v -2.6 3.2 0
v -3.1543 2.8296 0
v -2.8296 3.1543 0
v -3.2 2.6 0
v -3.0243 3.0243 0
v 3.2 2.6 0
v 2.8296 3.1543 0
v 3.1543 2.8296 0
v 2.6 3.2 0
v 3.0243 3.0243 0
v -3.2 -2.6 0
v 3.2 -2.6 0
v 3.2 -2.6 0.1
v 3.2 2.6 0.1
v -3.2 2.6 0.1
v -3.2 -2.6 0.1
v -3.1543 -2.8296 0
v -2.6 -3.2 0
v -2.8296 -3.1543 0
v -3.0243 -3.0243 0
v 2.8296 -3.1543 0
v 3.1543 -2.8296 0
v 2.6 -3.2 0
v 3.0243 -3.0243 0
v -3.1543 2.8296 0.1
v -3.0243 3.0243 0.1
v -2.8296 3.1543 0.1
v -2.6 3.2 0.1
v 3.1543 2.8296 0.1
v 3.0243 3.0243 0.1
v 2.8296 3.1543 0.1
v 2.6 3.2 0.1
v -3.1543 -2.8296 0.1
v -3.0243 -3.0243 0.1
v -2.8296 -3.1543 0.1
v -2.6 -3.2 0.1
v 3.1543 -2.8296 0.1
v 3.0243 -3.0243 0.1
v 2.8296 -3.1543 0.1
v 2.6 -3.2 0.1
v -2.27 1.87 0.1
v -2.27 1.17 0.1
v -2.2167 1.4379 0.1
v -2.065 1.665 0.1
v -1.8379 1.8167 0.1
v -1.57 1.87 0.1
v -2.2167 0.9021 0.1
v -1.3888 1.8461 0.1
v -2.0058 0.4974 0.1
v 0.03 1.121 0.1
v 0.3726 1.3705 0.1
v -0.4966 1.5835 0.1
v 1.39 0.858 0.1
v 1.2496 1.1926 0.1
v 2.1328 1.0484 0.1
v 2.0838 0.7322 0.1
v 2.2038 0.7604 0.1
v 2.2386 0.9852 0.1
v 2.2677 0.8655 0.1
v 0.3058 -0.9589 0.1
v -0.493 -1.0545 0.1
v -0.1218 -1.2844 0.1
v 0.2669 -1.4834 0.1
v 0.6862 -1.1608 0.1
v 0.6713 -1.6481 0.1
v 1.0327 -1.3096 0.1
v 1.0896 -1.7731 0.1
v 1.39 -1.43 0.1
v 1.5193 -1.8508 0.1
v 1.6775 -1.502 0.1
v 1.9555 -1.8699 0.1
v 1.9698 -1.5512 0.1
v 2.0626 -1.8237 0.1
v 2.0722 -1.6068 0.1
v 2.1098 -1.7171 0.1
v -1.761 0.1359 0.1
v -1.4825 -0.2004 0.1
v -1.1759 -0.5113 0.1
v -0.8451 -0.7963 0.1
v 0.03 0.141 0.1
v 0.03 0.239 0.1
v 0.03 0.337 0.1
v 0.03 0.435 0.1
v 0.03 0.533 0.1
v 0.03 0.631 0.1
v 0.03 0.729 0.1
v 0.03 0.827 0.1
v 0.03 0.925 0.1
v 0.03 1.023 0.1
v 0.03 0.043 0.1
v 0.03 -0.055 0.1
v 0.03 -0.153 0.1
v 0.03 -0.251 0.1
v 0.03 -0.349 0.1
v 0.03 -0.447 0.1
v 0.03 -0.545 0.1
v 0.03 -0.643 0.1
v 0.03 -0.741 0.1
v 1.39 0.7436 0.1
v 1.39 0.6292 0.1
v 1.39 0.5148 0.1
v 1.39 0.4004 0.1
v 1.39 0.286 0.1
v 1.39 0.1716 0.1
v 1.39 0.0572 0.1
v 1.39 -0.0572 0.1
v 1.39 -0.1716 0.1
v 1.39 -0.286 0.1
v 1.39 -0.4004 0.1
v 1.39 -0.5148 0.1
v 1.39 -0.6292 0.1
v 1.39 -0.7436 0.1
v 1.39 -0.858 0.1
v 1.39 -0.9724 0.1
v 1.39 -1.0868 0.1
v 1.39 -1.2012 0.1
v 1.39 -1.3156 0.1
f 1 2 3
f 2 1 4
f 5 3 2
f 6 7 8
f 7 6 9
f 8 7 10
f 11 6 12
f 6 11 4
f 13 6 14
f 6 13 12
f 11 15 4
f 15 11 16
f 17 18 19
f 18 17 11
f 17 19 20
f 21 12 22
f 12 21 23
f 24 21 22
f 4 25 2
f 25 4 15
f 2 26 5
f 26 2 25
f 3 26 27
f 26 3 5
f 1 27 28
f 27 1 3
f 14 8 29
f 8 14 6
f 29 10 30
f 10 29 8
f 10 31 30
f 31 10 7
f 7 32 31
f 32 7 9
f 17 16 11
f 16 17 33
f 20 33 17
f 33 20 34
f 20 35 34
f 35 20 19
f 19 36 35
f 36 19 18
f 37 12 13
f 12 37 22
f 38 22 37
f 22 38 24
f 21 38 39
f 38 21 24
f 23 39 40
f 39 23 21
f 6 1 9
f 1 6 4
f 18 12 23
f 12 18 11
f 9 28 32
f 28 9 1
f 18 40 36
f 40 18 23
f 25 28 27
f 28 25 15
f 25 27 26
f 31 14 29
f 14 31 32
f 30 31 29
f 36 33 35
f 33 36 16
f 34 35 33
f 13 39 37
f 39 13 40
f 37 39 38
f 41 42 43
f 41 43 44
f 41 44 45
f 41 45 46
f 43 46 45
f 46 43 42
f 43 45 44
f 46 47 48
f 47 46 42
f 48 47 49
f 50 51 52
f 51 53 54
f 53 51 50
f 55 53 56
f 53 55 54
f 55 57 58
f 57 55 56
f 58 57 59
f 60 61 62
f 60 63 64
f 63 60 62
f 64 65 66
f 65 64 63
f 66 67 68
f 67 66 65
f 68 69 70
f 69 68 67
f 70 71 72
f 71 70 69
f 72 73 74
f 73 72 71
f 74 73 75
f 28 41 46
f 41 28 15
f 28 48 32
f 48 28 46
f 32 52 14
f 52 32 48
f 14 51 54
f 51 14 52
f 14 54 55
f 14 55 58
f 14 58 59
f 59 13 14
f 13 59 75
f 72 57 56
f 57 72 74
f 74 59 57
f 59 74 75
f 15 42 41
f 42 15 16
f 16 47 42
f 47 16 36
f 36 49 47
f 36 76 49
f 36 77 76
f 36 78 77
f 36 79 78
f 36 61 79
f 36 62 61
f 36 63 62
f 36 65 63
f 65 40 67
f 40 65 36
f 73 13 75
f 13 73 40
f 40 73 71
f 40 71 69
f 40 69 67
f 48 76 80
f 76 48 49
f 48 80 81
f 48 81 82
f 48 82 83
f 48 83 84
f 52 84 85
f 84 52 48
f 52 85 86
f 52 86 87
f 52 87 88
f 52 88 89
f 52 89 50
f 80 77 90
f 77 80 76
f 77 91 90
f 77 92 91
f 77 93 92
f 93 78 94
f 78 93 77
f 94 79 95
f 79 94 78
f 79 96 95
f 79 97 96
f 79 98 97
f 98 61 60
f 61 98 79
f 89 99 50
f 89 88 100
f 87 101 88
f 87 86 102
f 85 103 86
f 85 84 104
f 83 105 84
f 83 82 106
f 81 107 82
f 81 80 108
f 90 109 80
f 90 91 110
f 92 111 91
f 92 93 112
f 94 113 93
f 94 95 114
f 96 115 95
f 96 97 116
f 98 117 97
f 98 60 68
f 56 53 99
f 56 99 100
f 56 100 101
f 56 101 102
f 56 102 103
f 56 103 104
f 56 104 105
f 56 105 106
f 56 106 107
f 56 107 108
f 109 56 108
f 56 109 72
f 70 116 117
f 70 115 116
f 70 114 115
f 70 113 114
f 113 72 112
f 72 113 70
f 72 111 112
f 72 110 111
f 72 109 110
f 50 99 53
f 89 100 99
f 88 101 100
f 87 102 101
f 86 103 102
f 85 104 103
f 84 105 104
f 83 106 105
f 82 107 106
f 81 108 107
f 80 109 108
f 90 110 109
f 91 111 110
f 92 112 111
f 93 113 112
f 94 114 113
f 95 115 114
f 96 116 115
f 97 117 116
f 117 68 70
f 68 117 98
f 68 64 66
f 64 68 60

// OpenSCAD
// file: ../p/box3u12.scad
use <../lib.scad>
function ldraw_lib__box3u12() = [
// 0 Box with 3 Parallel Faces without Any Edges
// 0 Name: box3u12.dat
// 0 Author: J.C. Tchang [tchang]
// 0 !LDRAW_ORG Primitive UPDATE 2014-02
// 0 !LICENSE Licensed under CC BY 4.0 : see CAreadme.txt
// 
// 0 BFC CERTIFY CCW
  [0,"BFC","CERTIFY"],
  [0,"BFC","CCW"],
// 
// 0 !HISTORY 2014-12-23 [PTadmin] Official Update 2014-02
// 
// 
// 4 16 -1 1 1 1 1 1 1 1 -1 -1 1 -1
  [4,16,-1,1,1,1,1,1,1,1,-1,-1,1,-1],
// 4 16 -1 1 1 -1 0 1 1 0 1 1 1 1
  [4,16,-1,1,1,-1,0,1,1,0,1,1,1,1],
// 4 16 1 1 -1 1 0 -1 -1 0 -1 -1 1 -1
  [4,16,1,1,-1,1,0,-1,-1,0,-1,-1,1,-1],
];
module ldraw_lib__box3u12(step=0, col=false, unit=2/5, alt=false, line=0.2, solid=!$preview)
    makepoly(ldraw_lib__box3u12(), step=step, col=col, unit=unit, alt=alt, line=line, solid=solid);
ldraw_lib__box3u12(line=0.2);
// file: ../p/1-4cyli.scad
use <../lib.scad>
function ldraw_lib__1_4cyli() = [
// 0 Cylinder 0.25
// 0 Name: 1-4cyli.dat
// 0 Author: James Jessiman
// 0 !LDRAW_ORG Primitive UPDATE 2012-01
// 0 !LICENSE Licensed under CC BY 4.0 : see CAreadme.txt
// 
// 0 BFC CERTIFY CCW
  [0,"BFC","CERTIFY"],
  [0,"BFC","CCW"],
// 
// 0 !HISTORY 2002-03-23 [sbliss] Added BFC statement.
// 0 !HISTORY 2002-04-25 [PTadmin] Official Update 2002-02
// 0 !HISTORY 2007-06-22 [PTadmin] Header formatted for Contributor Agreement
// 0 !HISTORY 2008-07-01 [PTadmin] Official Update 2008-01
// 0 !HISTORY 2012-02-16 [Philo] Changed to CCW
// 0 !HISTORY 2012-03-30 [PTadmin] Official Update 2012-01
// 
// 
// 4 16 1 1 0 0.9239 1 0.3827 0.9239 0 0.3827 1 0 0
  [4,16,1,1,0,0.9239,1,0.3827,0.9239,0,0.3827,1,0,0],
// 5 24 1 0 0 1 1 0 0.9239 0 0.3827 1 0 -1
  [5,24,1,0,0,1,1,0,0.9239,0,0.3827,1,0,-1],
// 4 16 0.9239 1 0.3827 0.7071 1 0.7071 0.7071 0 0.7071 0.9239 0 0.3827
  [4,16,0.9239,1,0.3827,0.7071,1,0.7071,0.7071,0,0.7071,0.9239,0,0.3827],
// 5 24 0.9239 0 0.3827 0.9239 1 0.3827 0.7071 0 0.7071 1 0 0
  [5,24,0.9239,0,0.3827,0.9239,1,0.3827,0.7071,0,0.7071,1,0,0],
// 4 16 0.7071 1 0.7071 0.3827 1 0.9239 0.3827 0 0.9239 0.7071 0 0.7071
  [4,16,0.7071,1,0.7071,0.3827,1,0.9239,0.3827,0,0.9239,0.7071,0,0.7071],
// 5 24 0.7071 0 0.7071 0.7071 1 0.7071 0.3827 0 0.9239 0.9239 0 0.3827
  [5,24,0.7071,0,0.7071,0.7071,1,0.7071,0.3827,0,0.9239,0.9239,0,0.3827],
// 4 16 0.3827 1 0.9239 0 1 1 0 0 1 0.3827 0 0.9239
  [4,16,0.3827,1,0.9239,0,1,1,0,0,1,0.3827,0,0.9239],
// 5 24 0.3827 0 0.9239 0.3827 1 0.9239 0 0 1 0.7071 0 0.7071
  [5,24,0.3827,0,0.9239,0.3827,1,0.9239,0,0,1,0.7071,0,0.7071],
// 5 24 0 0 1 0 1 1 0.3827 0 0.9239 -1 0 1
  [5,24,0,0,1,0,1,1,0.3827,0,0.9239,-1,0,1],
];
module ldraw_lib__1_4cyli(step=0, col=false, unit=2/5, alt=false, line=0.2, solid=!$preview)
    makepoly(ldraw_lib__1_4cyli(), step=step, col=col, unit=unit, alt=alt, line=line, solid=solid);
ldraw_lib__1_4cyli(line=0.2);
// file: s/stickerback008x008.scad
use <../../lib.scad>
use <../../p/1-4chrd.scad>
use <../../p/1-4cyli.scad>
use <../../p/box3u12.scad>
function ldraw_lib__s__stickerback008x008() = [
// 0 ~Sticker Back  0.8 x  0.8
// 0 Name: s\stickerback008x008.dat
// 0 Author: Massimo Maso [Sirio]
// 0 !LDRAW_ORG Subpart UPDATE 2025-08
// 0 !LICENSE Licensed under CC BY 4.0 : see CAreadme.txt
// 
// 0 BFC CERTIFY CCW
  [0,"BFC","CERTIFY"],
  [0,"BFC","CCW"],
// 
// 0 !HISTORY 2025-08-31 [OrionP] Official Update 2025-08
// 
// 0 // Primitives
// 1 16 -6.5 0 6.5 -1.5 0 0 0 -1 0 0 0 1.5 1-4chrd.dat
  [1,16,-6.5,0,6.5,-1.5,0,0,0,-1,0,0,0,1.5, ldraw_lib__1_4chrd()],
// 1 16 6.5 0 6.5 1.5 0 0 0 -1 0 0 0 1.5 1-4chrd.dat
  [1,16,6.5,0,6.5,1.5,0,0,0,-1,0,0,0,1.5, ldraw_lib__1_4chrd()],
// 1 16 0 -.25 0 0 0 8 0 .25 0 6.5 0 0 box3u12.dat
  [1,16,0,-.25,0,0,0,8,0,.25,0,6.5,0,0, ldraw_lib__box3u12()],
// 1 16 -6.5 0 -6.5 -1.5 0 0 0 -1 0 0 0 -1.5 1-4chrd.dat
  [1,16,-6.5,0,-6.5,-1.5,0,0,0,-1,0,0,0,-1.5, ldraw_lib__1_4chrd()],
// 1 16 6.5 0 -6.5 1.5 0 0 0 -1 0 0 0 -1.5 1-4chrd.dat
  [1,16,6.5,0,-6.5,1.5,0,0,0,-1,0,0,0,-1.5, ldraw_lib__1_4chrd()],
// 1 16 -6.5 0 6.5 -1.5 0 0 0 -.25 0 0 0 1.5 1-4cyli.dat
  [1,16,-6.5,0,6.5,-1.5,0,0,0,-.25,0,0,0,1.5, ldraw_lib__1_4cyli()],
// 1 16 6.5 0 6.5 1.5 0 0 0 -.25 0 0 0 1.5 1-4cyli.dat
  [1,16,6.5,0,6.5,1.5,0,0,0,-.25,0,0,0,1.5, ldraw_lib__1_4cyli()],
// 1 16 -6.5 0 -6.5 -1.5 0 0 0 -.25 0 0 0 -1.5 1-4cyli.dat
  [1,16,-6.5,0,-6.5,-1.5,0,0,0,-.25,0,0,0,-1.5, ldraw_lib__1_4cyli()],
// 1 16 6.5 0 -6.5 1.5 0 0 0 -.25 0 0 0 -1.5 1-4cyli.dat
  [1,16,6.5,0,-6.5,1.5,0,0,0,-.25,0,0,0,-1.5, ldraw_lib__1_4cyli()],
// 0 // Bottom faces
// 4 16 -8 0 6.5 -6.5 0 8 6.5 0 8 8 0 6.5
  [4,16,-8,0,6.5,-6.5,0,8,6.5,0,8,8,0,6.5],
// 4 16 -8 0 -6.5 8 0 -6.5 6.5 0 -8 -6.5 0 -8
  [4,16,-8,0,-6.5,8,0,-6.5,6.5,0,-8,-6.5,0,-8],
// 0 // Lateral faces
// 4 16 -6.5 0 8 -6.5 -.25 8 6.5 -.25 8 6.5 0 8
  [4,16,-6.5,0,8,-6.5,-.25,8,6.5,-.25,8,6.5,0,8],
// 4 16 -6.5 0 -8 6.5 0 -8 6.5 -.25 -8 -6.5 -.25 -8
  [4,16,-6.5,0,-8,6.5,0,-8,6.5,-.25,-8,-6.5,-.25,-8],
];
module ldraw_lib__s__stickerback008x008(step=0, col=false, unit=2/5, alt=false, line=0.2, solid=!$preview)
    makepoly(ldraw_lib__s__stickerback008x008(), step=step, col=col, unit=unit, alt=alt, line=line, solid=solid);
ldraw_lib__s__stickerback008x008(line=0.2);
// file: ../p/1-4ndis.scad
use <../lib.scad>
function ldraw_lib__1_4ndis() = [
// 0 Disc Negative 0.25
// 0 Name: 1-4ndis.dat
// 0 Author: James Jessiman
// 0 !LDRAW_ORG Primitive UPDATE 2012-01
// 0 !LICENSE Licensed under CC BY 4.0 : see CAreadme.txt
// 
// 0 BFC CERTIFY CCW
  [0,"BFC","CERTIFY"],
  [0,"BFC","CCW"],
// 
// 0 !HISTORY 2002-03-23 [sbliss] Added BFC Statement
// 0 !HISTORY 2002-04-25 [PTadmin] Official Update 2002-02
// 0 !HISTORY 2007-06-22 [PTadmin] Header formatted for Contributor Agreement
// 0 !HISTORY 2008-07-01 [PTadmin] Official Update 2008-01
// 0 !HISTORY 2012-02-16 [Philo] Changed to CCW
// 0 !HISTORY 2012-03-30 [PTadmin] Official Update 2012-01
// 
// 
// 3 16 0.9239 0 0.3827 1 0 0 1 0 1
  [3,16,0.9239,0,0.3827,1,0,0,1,0,1],
// 3 16 0.7071 0 0.7071 0.9239 0 0.3827 1 0 1
  [3,16,0.7071,0,0.7071,0.9239,0,0.3827,1,0,1],
// 3 16 0.3827 0 0.9239 0.7071 0 0.7071 1 0 1
  [3,16,0.3827,0,0.9239,0.7071,0,0.7071,1,0,1],
// 3 16 0 0 1 0.3827 0 0.9239 1 0 1
  [3,16,0,0,1,0.3827,0,0.9239,1,0,1],
];
module ldraw_lib__1_4ndis(step=0, col=false, unit=2/5, alt=false, line=0.2, solid=!$preview)
    makepoly(ldraw_lib__1_4ndis(), step=step, col=col, unit=unit, alt=alt, line=line, solid=solid);
ldraw_lib__1_4ndis(line=0.2);
// file: ../p/1-4chrd.scad
use <../lib.scad>
function ldraw_lib__1_4chrd() = [
// 0 Chord 0.25
// 0 Name: 1-4chrd.dat
// 0 Author: Max Martin Richter [MMR1988]
// 0 !LDRAW_ORG Primitive UPDATE 2023-05
// 0 !LICENSE Licensed under CC BY 4.0 : see CAreadme.txt
// 
// 0 BFC CERTIFY CCW
  [0,"BFC","CERTIFY"],
  [0,"BFC","CCW"],
// 
// 0 !HISTORY 2004-04-22 [PTadmin] Official Update 2004-02
// 0 !HISTORY 2007-10-09 [PTadmin] Header formatted for Contributor Agreement
// 0 !HISTORY 2008-07-01 [PTadmin] Official Update 2008-01
// 0 !HISTORY 2012-08-02 [MMR1988] Re-creation with PrimGen2 and Rectifier
// 0 !HISTORY 2012-08-09 [PTadmin] Official Update 2012-02
// 0 !HISTORY 2023-10-27 [OrionP] Change author to MMR1988 from hafhead
// 0 !HISTORY 2023-10-31 [OrionP] Official Update 2023-05
// 
// 4 16 0.9239 0 0.3827 0.3827 0 0.9239 0 0 1 1 0 0
  [4,16,0.9239,0,0.3827,0.3827,0,0.9239,0,0,1,1,0,0],
// 3 16 0.7071 0 0.7071 0.3827 0 0.9239 0.9239 0 0.3827
  [3,16,0.7071,0,0.7071,0.3827,0,0.9239,0.9239,0,0.3827],
];
module ldraw_lib__1_4chrd(step=0, col=false, unit=2/5, alt=false, line=0.2, solid=!$preview)
    makepoly(ldraw_lib__1_4chrd(), step=step, col=col, unit=unit, alt=alt, line=line, solid=solid);
ldraw_lib__1_4chrd(line=0.2);
// main file
use <../lib.scad>
use <../p/1-4chrd.scad>
use <../p/1-4ndis.scad>
use <s/stickerback008x008.scad>
function ldraw_lib__6177960g() = [
// 0 Sticker  0.8 x  0.8 with Black Air Vent on Orange Background Right (Needs Work)
// 0 Name: 6177960g.dat
// 0 Author: Massimo Maso [Sirio]
// 0 !LDRAW_ORG Part UPDATE 2025-08
// 0 !LICENSE Licensed under CC BY 4.0 : see CAreadme.txt
// 
// 0 !HELP Needs work: Some parts should be halftones.
// 0 !HELP I indicated them with triangles black and orange instead of mix of 0 discs and 25 ndis.
// 0 !HELP For now I don't have enough information to create the matrix of dots.
// 
// 0 BFC CERTIFY CCW
  [0,"BFC","CERTIFY"],
  [0,"BFC","CCW"],
// 
// 0 !KEYWORDS 720S, BrickLink 75880stk01, McLaren, Rebrickable 30896, Set 75880
// 0 !KEYWORDS Speed Champions
// 
// 0 !HISTORY 2025-08-31 [OrionP] Official Update 2025-08
// 
// 0 // Stickerback
// 1 16 0 0 0 1 0 0 0 1 0 0 0 1 s\stickerback008x008.dat
  [1,16,0,0,0,1,0,0,0,1,0,0,0,1, ldraw_lib__s__stickerback008x008()],
// 0 // Primitives
// 1 25 -6.5 -.25 6.5 -1.5 0 0 0 1 0 0 0 1.5 1-4chrd.dat
  [1,25,-6.5,-.25,6.5,-1.5,0,0,0,1,0,0,0,1.5, ldraw_lib__1_4chrd()],
// 1 25 6.5 -.25 6.5 1.5 0 0 0 1 0 0 0 1.5 1-4chrd.dat
  [1,25,6.5,-.25,6.5,1.5,0,0,0,1,0,0,0,1.5, ldraw_lib__1_4chrd()],
// 1 25 -6.5 -.25 -6.5 -1.5 0 0 0 1 0 0 0 -1.5 1-4chrd.dat
  [1,25,-6.5,-.25,-6.5,-1.5,0,0,0,1,0,0,0,-1.5, ldraw_lib__1_4chrd()],
// 1 25 6.5 -.25 -6.5 1.5 0 0 0 1 0 0 0 -1.5 1-4chrd.dat
  [1,25,6.5,-.25,-6.5,1.5,0,0,0,1,0,0,0,-1.5, ldraw_lib__1_4chrd()],
// 1 25 -3.925 -.25 2.925 -1.75 0 0 0 1 0 0 0 1.75 1-4ndis.dat
  [1,25,-3.925,-.25,2.925,-1.75,0,0,0,1,0,0,0,1.75, ldraw_lib__1_4ndis()],
// 1 0 -3.925 -.25 2.925 -1.75 0 0 0 1 0 0 0 1.75 1-4chrd.dat
  [1,0,-3.925,-.25,2.925,-1.75,0,0,0,1,0,0,0,1.75, ldraw_lib__1_4chrd()],
// 0 // Top face
// 0 // Black faces
// 4 0 -3.4721 -.25 4.6153 -3.925 -.25 4.675 -5.675 -.25 2.925 -5.5418 -.25 2.2553
  [4,0,-3.4721,-.25,4.6153,-3.925,-.25,4.675,-5.675,-.25,2.925,-5.5418,-.25,2.2553],
// 3 0 -3.4721 -.25 4.6153 -5.5418 -.25 2.2553 -5.0146 -.25 1.2436
  [3,0,-3.4721,-.25,4.6153,-5.5418,-.25,2.2553,-5.0146,-.25,1.2436],
// 3 0 .075 -.25 2.8025 .9314 -.25 3.4262 -1.2414 -.25 3.9588
  [3,0,.075,-.25,2.8025,.9314,-.25,3.4262,-1.2414,-.25,3.9588],
// 4 0 3.475 -.25 2.145 3.1241 -.25 2.9816 .9314 -.25 3.4262 .075 -.25 2.8025
  [4,0,3.475,-.25,2.145,3.1241,-.25,2.9816,.9314,-.25,3.4262,.075,-.25,2.8025],
// 4 0 5.332 -.25 2.6209 3.1241 -.25 2.9816 3.475 -.25 2.145 5.2095 -.25 1.8304
  [4,0,5.332,-.25,2.6209,3.1241,-.25,2.9816,3.475,-.25,2.145,5.2095,-.25,1.8304],
// 4 0 5.5966 -.25 2.4629 5.332 -.25 2.6209 5.2095 -.25 1.8304 5.5094 -.25 1.9009
  [4,0,5.5966,-.25,2.4629,5.332,-.25,2.6209,5.2095,-.25,1.8304,5.5094,-.25,1.9009],
// 3 0 5.5966 -.25 2.4629 5.5094 -.25 1.9009 5.6693 -.25 2.1637
  [3,0,5.5966,-.25,2.4629,5.5094,-.25,1.9009,5.6693,-.25,2.1637],
// 3 0 .7646 -.25 -2.3972 -1.2325 -.25 -2.6363 -.3044 -.25 -3.211
  [3,0,.7646,-.25,-2.3972,-1.2325,-.25,-2.6363,-.3044,-.25,-3.211],
// 4 0 .7646 -.25 -2.3972 -.3044 -.25 -3.211 .6672 -.25 -3.7086 1.7154 -.25 -2.902
  [4,0,.7646,-.25,-2.3972,-.3044,-.25,-3.211,.6672,-.25,-3.7086,1.7154,-.25,-2.902],
// 4 0 2.5817 -.25 -3.2739 1.7154 -.25 -2.902 .6672 -.25 -3.7086 1.6782 -.25 -4.1202
  [4,0,2.5817,-.25,-3.2739,1.7154,-.25,-2.902,.6672,-.25,-3.7086,1.6782,-.25,-4.1202],
// 4 0 2.5817 -.25 -3.2739 1.6782 -.25 -4.1202 2.7241 -.25 -4.4327 3.475 -.25 -3.575
  [4,0,2.5817,-.25,-3.2739,1.6782,-.25,-4.1202,2.7241,-.25,-4.4327,3.475,-.25,-3.575],
// 4 0 4.1937 -.25 -3.7551 3.475 -.25 -3.575 2.7241 -.25 -4.4327 3.7983 -.25 -4.6269
  [4,0,4.1937,-.25,-3.7551,3.475,-.25,-3.575,2.7241,-.25,-4.4327,3.7983,-.25,-4.6269],
// 4 0 4.1937 -.25 -3.7551 3.7983 -.25 -4.6269 4.8888 -.25 -4.6748 4.9244 -.25 -3.8781
  [4,0,4.1937,-.25,-3.7551,3.7983,-.25,-4.6269,4.8888,-.25,-4.6748,4.9244,-.25,-3.8781],
// 4 0 5.1806 -.25 -4.0169 4.9244 -.25 -3.8781 4.8888 -.25 -4.6748 5.1564 -.25 -4.5592
  [4,0,5.1806,-.25,-4.0169,4.9244,-.25,-3.8781,4.8888,-.25,-4.6748,5.1564,-.25,-4.5592],
// 3 0 5.1806 -.25 -4.0169 5.1564 -.25 -4.5592 5.2746 -.25 -4.2928
  [3,0,5.1806,-.25,-4.0169,5.1564,-.25,-4.5592,5.2746,-.25,-4.2928],
// 0 // Orange
// 4 25 -6.5 -.25 8 -8 -.25 6.5 -5.675 -.25 4.675 -3.925 -.25 4.675
  [4,25,-6.5,-.25,8,-8,-.25,6.5,-5.675,-.25,4.675,-3.925,-.25,4.675],
// 4 25 -6.5 -.25 8 -3.925 -.25 4.675 -3.4721 -.25 4.6153 6.5 -.25 8
  [4,25,-6.5,-.25,8,-3.925,-.25,4.675,-3.4721,-.25,4.6153,6.5,-.25,8],
// 4 25 -1.2414 -.25 3.9588 8 -.25 6.5 6.5 -.25 8 -3.4721 -.25 4.6153
  [4,25,-1.2414,-.25,3.9588,8,-.25,6.5,6.5,-.25,8,-3.4721,-.25,4.6153],
// 4 25 -1.2414 -.25 3.9588 .9314 -.25 3.4262 3.1241 -.25 2.9816 8 -.25 6.5
  [4,25,-1.2414,-.25,3.9588,.9314,-.25,3.4262,3.1241,-.25,2.9816,8,-.25,6.5],
// 3 25 8 -.25 6.5 3.1241 -.25 2.9816 5.332 -.25 2.6209
  [3,25,8,-.25,6.5,3.1241,-.25,2.9816,5.332,-.25,2.6209],
// 3 25 8 -.25 6.5 5.332 -.25 2.6209 5.5966 -.25 2.4629
  [3,25,8,-.25,6.5,5.332,-.25,2.6209,5.5966,-.25,2.4629],
// 3 25 8 -.25 6.5 5.5966 -.25 2.4629 5.6693 -.25 2.1637
  [3,25,8,-.25,6.5,5.5966,-.25,2.4629,5.6693,-.25,2.1637],
// 4 25 8 -.25 6.5 5.6693 -.25 2.1637 5.2746 -.25 -4.2928 8 -.25 -6.5
  [4,25,8,-.25,6.5,5.6693,-.25,2.1637,5.2746,-.25,-4.2928,8,-.25,-6.5],
// 4 25 5.5094 -.25 1.9009 5.2095 -.25 1.8304 4.9244 -.25 -3.8781 5.1806 -.25 -4.0169
  [4,25,5.5094,-.25,1.9009,5.2095,-.25,1.8304,4.9244,-.25,-3.8781,5.1806,-.25,-4.0169],
// 4 25 5.5094 -.25 1.9009 5.1806 -.25 -4.0169 5.2746 -.25 -4.2928 5.6693 -.25 2.1637
  [4,25,5.5094,-.25,1.9009,5.1806,-.25,-4.0169,5.2746,-.25,-4.2928,5.6693,-.25,2.1637],
// 4 25 -8 -.25 -6.5 -5.675 -.25 2.925 -5.675 -.25 4.675 -8 -.25 6.5
  [4,25,-8,-.25,-6.5,-5.675,-.25,2.925,-5.675,-.25,4.675,-8,-.25,6.5],
// 4 25 -8 -.25 -6.5 -6.5 -.25 -8 -5.5418 -.25 2.2553 -5.675 -.25 2.925
  [4,25,-8,-.25,-6.5,-6.5,-.25,-8,-5.5418,-.25,2.2553,-5.675,-.25,2.925],
// 3 25 -6.5 -.25 -8 -5.0146 -.25 1.2436 -5.5418 -.25 2.2553
  [3,25,-6.5,-.25,-8,-5.0146,-.25,1.2436,-5.5418,-.25,2.2553],
// 3 25 -6.5 -.25 -8 -4.4025 -.25 .3398 -5.0146 -.25 1.2436
  [3,25,-6.5,-.25,-8,-4.4025,-.25,.3398,-5.0146,-.25,1.2436],
// 3 25 -6.5 -.25 -8 -3.7062 -.25 -.5009 -4.4025 -.25 .3398
  [3,25,-6.5,-.25,-8,-3.7062,-.25,-.5009,-4.4025,-.25,.3398],
// 3 25 -6.5 -.25 -8 -2.9397 -.25 -1.2782 -3.7062 -.25 -.5009
  [3,25,-6.5,-.25,-8,-2.9397,-.25,-1.2782,-3.7062,-.25,-.5009],
// 3 25 -6.5 -.25 -8 -2.1128 -.25 -1.9907 -2.9397 -.25 -1.2782
  [3,25,-6.5,-.25,-8,-2.1128,-.25,-1.9907,-2.9397,-.25,-1.2782],
// 3 25 -6.5 -.25 -8 -1.2325 -.25 -2.6363 -2.1128 -.25 -1.9907
  [3,25,-6.5,-.25,-8,-1.2325,-.25,-2.6363,-2.1128,-.25,-1.9907],
// 3 25 -6.5 -.25 -8 -.3044 -.25 -3.211 -1.2325 -.25 -2.6363
  [3,25,-6.5,-.25,-8,-.3044,-.25,-3.211,-1.2325,-.25,-2.6363],
// 3 25 -6.5 -.25 -8 .6672 -.25 -3.7086 -.3044 -.25 -3.211
  [3,25,-6.5,-.25,-8,.6672,-.25,-3.7086,-.3044,-.25,-3.211],
// 3 25 -6.5 -.25 -8 1.6782 -.25 -4.1202 .6672 -.25 -3.7086
  [3,25,-6.5,-.25,-8,1.6782,-.25,-4.1202,.6672,-.25,-3.7086],
// 4 25 -6.5 -.25 -8 6.5 -.25 -8 2.7241 -.25 -4.4327 1.6782 -.25 -4.1202
  [4,25,-6.5,-.25,-8,6.5,-.25,-8,2.7241,-.25,-4.4327,1.6782,-.25,-4.1202],
// 4 25 6.5 -.25 -8 8 -.25 -6.5 5.2746 -.25 -4.2928 5.1564 -.25 -4.5592
  [4,25,6.5,-.25,-8,8,-.25,-6.5,5.2746,-.25,-4.2928,5.1564,-.25,-4.5592],
// 3 25 6.5 -.25 -8 5.1564 -.25 -4.5592 4.8888 -.25 -4.6748
  [3,25,6.5,-.25,-8,5.1564,-.25,-4.5592,4.8888,-.25,-4.6748],
// 3 25 6.5 -.25 -8 4.8888 -.25 -4.6748 3.7983 -.25 -4.6269
  [3,25,6.5,-.25,-8,4.8888,-.25,-4.6748,3.7983,-.25,-4.6269],
// 3 25 6.5 -.25 -8 3.7983 -.25 -4.6269 2.7241 -.25 -4.4327
  [3,25,6.5,-.25,-8,3.7983,-.25,-4.6269,2.7241,-.25,-4.4327],
// 0 // Halftone (actually 0 discs and 25 ndis)
// 0 // Black faces
// 4 0 -3.4721 -.25 4.6153 -5.0146 -.25 1.2436 -4.4025 -.25 .3398 .075 -.25 .3525
  [4,0,-3.4721,-.25,4.6153,-5.0146,-.25,1.2436,-4.4025,-.25,.3398,.075,-.25,.3525],
// 3 0 -3.4721 -.25 4.6153 .075 -.25 .3525 .075 -.25 .5975
  [3,0,-3.4721,-.25,4.6153,.075,-.25,.3525,.075,-.25,.5975],
// 3 0 -3.4721 -.25 4.6153 .075 -.25 .5975 .075 -.25 .8425
  [3,0,-3.4721,-.25,4.6153,.075,-.25,.5975,.075,-.25,.8425],
// 3 0 -3.4721 -.25 4.6153 .075 -.25 .8425 .075 -.25 1.0875
  [3,0,-3.4721,-.25,4.6153,.075,-.25,.8425,.075,-.25,1.0875],
// 3 0 -3.4721 -.25 4.6153 .075 -.25 1.0875 .075 -.25 1.3325
  [3,0,-3.4721,-.25,4.6153,.075,-.25,1.0875,.075,-.25,1.3325],
// 4 0 -3.4721 -.25 4.6153 .075 -.25 1.3325 .075 -.25 1.5775 -1.2414 -.25 3.9588
  [4,0,-3.4721,-.25,4.6153,.075,-.25,1.3325,.075,-.25,1.5775,-1.2414,-.25,3.9588],
// 3 0 -1.2414 -.25 3.9588 .075 -.25 1.5775 .075 -.25 1.8225
  [3,0,-1.2414,-.25,3.9588,.075,-.25,1.5775,.075,-.25,1.8225],
// 3 0 -1.2414 -.25 3.9588 .075 -.25 1.8225 .075 -.25 2.0675
  [3,0,-1.2414,-.25,3.9588,.075,-.25,1.8225,.075,-.25,2.0675],
// 3 0 -1.2414 -.25 3.9588 .075 -.25 2.0675 .075 -.25 2.3125
  [3,0,-1.2414,-.25,3.9588,.075,-.25,2.0675,.075,-.25,2.3125],
// 3 0 -1.2414 -.25 3.9588 .075 -.25 2.3125 .075 -.25 2.5575
  [3,0,-1.2414,-.25,3.9588,.075,-.25,2.3125,.075,-.25,2.5575],
// 3 0 -1.2414 -.25 3.9588 .075 -.25 2.5575 .075 -.25 2.8025
  [3,0,-1.2414,-.25,3.9588,.075,-.25,2.5575,.075,-.25,2.8025],
// 4 0 -3.7062 -.25 -.5009 .075 -.25 .1075 .075 -.25 .3525 -4.4025 -.25 .3398
  [4,0,-3.7062,-.25,-.5009,.075,-.25,.1075,.075,-.25,.3525,-4.4025,-.25,.3398],
// 3 0 -3.7062 -.25 -.5009 .075 -.25 -.1375 .075 -.25 .1075
  [3,0,-3.7062,-.25,-.5009,.075,-.25,-.1375,.075,-.25,.1075],
// 3 0 -3.7062 -.25 -.5009 .075 -.25 -.3825 .075 -.25 -.1375
  [3,0,-3.7062,-.25,-.5009,.075,-.25,-.3825,.075,-.25,-.1375],
// 3 0 -3.7062 -.25 -.5009 .075 -.25 -.6275 .075 -.25 -.3825
  [3,0,-3.7062,-.25,-.5009,.075,-.25,-.6275,.075,-.25,-.3825],
// 4 0 -3.7062 -.25 -.5009 -2.9397 -.25 -1.2782 .075 -.25 -.8725 .075 -.25 -.6275
  [4,0,-3.7062,-.25,-.5009,-2.9397,-.25,-1.2782,.075,-.25,-.8725,.075,-.25,-.6275],
// 4 0 -2.1128 -.25 -1.9907 .075 -.25 -1.1175 .075 -.25 -.8725 -2.9397 -.25 -1.2782
  [4,0,-2.1128,-.25,-1.9907,.075,-.25,-1.1175,.075,-.25,-.8725,-2.9397,-.25,-1.2782],
// 3 0 -2.1128 -.25 -1.9907 .075 -.25 -1.3625 .075 -.25 -1.1175
  [3,0,-2.1128,-.25,-1.9907,.075,-.25,-1.3625,.075,-.25,-1.1175],
// 3 0 -2.1128 -.25 -1.9907 .075 -.25 -1.6075 .075 -.25 -1.3625
  [3,0,-2.1128,-.25,-1.9907,.075,-.25,-1.6075,.075,-.25,-1.3625],
// 3 0 -2.1128 -.25 -1.9907 .075 -.25 -1.8525 .075 -.25 -1.6075
  [3,0,-2.1128,-.25,-1.9907,.075,-.25,-1.8525,.075,-.25,-1.6075],
// 4 0 -2.1128 -.25 -1.9907 -1.2325 -.25 -2.6363 .7646 -.25 -2.3972 .075 -.25 -1.8525
  [4,0,-2.1128,-.25,-1.9907,-1.2325,-.25,-2.6363,.7646,-.25,-2.3972,.075,-.25,-1.8525],
// 3 0 .075 -.25 2.5575 3.475 -.25 1.859 .075 -.25 2.8025
  [3,0,.075,-.25,2.5575,3.475,-.25,1.859,.075,-.25,2.8025],
// 3 0 .075 -.25 2.5575 .075 -.25 2.3125 3.475 -.25 1.573
  [3,0,.075,-.25,2.5575,.075,-.25,2.3125,3.475,-.25,1.573],
// 3 0 .075 -.25 2.0675 3.475 -.25 1.287 .075 -.25 2.3125
  [3,0,.075,-.25,2.0675,3.475,-.25,1.287,.075,-.25,2.3125],
// 3 0 .075 -.25 2.0675 .075 -.25 1.8225 3.475 -.25 1.001
  [3,0,.075,-.25,2.0675,.075,-.25,1.8225,3.475,-.25,1.001],
// 3 0 .075 -.25 1.5775 3.475 -.25 .715 .075 -.25 1.8225
  [3,0,.075,-.25,1.5775,3.475,-.25,.715,.075,-.25,1.8225],
// 3 0 .075 -.25 1.5775 .075 -.25 1.3325 3.475 -.25 .429
  [3,0,.075,-.25,1.5775,.075,-.25,1.3325,3.475,-.25,.429],
// 3 0 .075 -.25 1.0875 3.475 -.25 .143 .075 -.25 1.3325
  [3,0,.075,-.25,1.0875,3.475,-.25,.143,.075,-.25,1.3325],
// 3 0 .075 -.25 1.0875 .075 -.25 .8425 3.475 -.25 -.143
  [3,0,.075,-.25,1.0875,.075,-.25,.8425,3.475,-.25,-.143],
// 3 0 .075 -.25 .5975 3.475 -.25 -.429 .075 -.25 .8425
  [3,0,.075,-.25,.5975,3.475,-.25,-.429,.075,-.25,.8425],
// 3 0 .075 -.25 .5975 .075 -.25 .3525 3.475 -.25 -.715
  [3,0,.075,-.25,.5975,.075,-.25,.3525,3.475,-.25,-.715],
// 3 0 .075 -.25 .1075 3.475 -.25 -1.001 .075 -.25 .3525
  [3,0,.075,-.25,.1075,3.475,-.25,-1.001,.075,-.25,.3525],
// 3 0 .075 -.25 .1075 .075 -.25 -.1375 3.475 -.25 -1.287
  [3,0,.075,-.25,.1075,.075,-.25,-.1375,3.475,-.25,-1.287],
// 3 0 .075 -.25 -.3825 3.475 -.25 -1.573 .075 -.25 -.1375
  [3,0,.075,-.25,-.3825,3.475,-.25,-1.573,.075,-.25,-.1375],
// 3 0 .075 -.25 -.3825 .075 -.25 -.6275 3.475 -.25 -1.859
  [3,0,.075,-.25,-.3825,.075,-.25,-.6275,3.475,-.25,-1.859],
// 3 0 .075 -.25 -.8725 3.475 -.25 -2.145 .075 -.25 -.6275
  [3,0,.075,-.25,-.8725,3.475,-.25,-2.145,.075,-.25,-.6275],
// 3 0 .075 -.25 -.8725 .075 -.25 -1.1175 3.475 -.25 -2.431
  [3,0,.075,-.25,-.8725,.075,-.25,-1.1175,3.475,-.25,-2.431],
// 3 0 .075 -.25 -1.3625 3.475 -.25 -2.717 .075 -.25 -1.1175
  [3,0,.075,-.25,-1.3625,3.475,-.25,-2.717,.075,-.25,-1.1175],
// 3 0 .075 -.25 -1.3625 .075 -.25 -1.6075 3.475 -.25 -3.003
  [3,0,.075,-.25,-1.3625,.075,-.25,-1.6075,3.475,-.25,-3.003],
// 3 0 .075 -.25 -1.8525 3.475 -.25 -3.289 .075 -.25 -1.6075
  [3,0,.075,-.25,-1.8525,3.475,-.25,-3.289,.075,-.25,-1.6075],
// 3 0 .075 -.25 -1.8525 .7646 -.25 -2.3972 3.475 -.25 -3.575
  [3,0,.075,-.25,-1.8525,.7646,-.25,-2.3972,3.475,-.25,-3.575],
// 0 // Orange faces
// 3 25 5.2095 -.25 1.8304 3.475 -.25 2.145 3.475 -.25 1.859
  [3,25,5.2095,-.25,1.8304,3.475,-.25,2.145,3.475,-.25,1.859],
// 3 25 5.2095 -.25 1.8304 3.475 -.25 1.859 3.475 -.25 1.573
  [3,25,5.2095,-.25,1.8304,3.475,-.25,1.859,3.475,-.25,1.573],
// 3 25 5.2095 -.25 1.8304 3.475 -.25 1.573 3.475 -.25 1.287
  [3,25,5.2095,-.25,1.8304,3.475,-.25,1.573,3.475,-.25,1.287],
// 3 25 5.2095 -.25 1.8304 3.475 -.25 1.287 3.475 -.25 1.001
  [3,25,5.2095,-.25,1.8304,3.475,-.25,1.287,3.475,-.25,1.001],
// 3 25 5.2095 -.25 1.8304 3.475 -.25 1.001 3.475 -.25 .715
  [3,25,5.2095,-.25,1.8304,3.475,-.25,1.001,3.475,-.25,.715],
// 3 25 5.2095 -.25 1.8304 3.475 -.25 .715 3.475 -.25 .429
  [3,25,5.2095,-.25,1.8304,3.475,-.25,.715,3.475,-.25,.429],
// 3 25 5.2095 -.25 1.8304 3.475 -.25 .429 3.475 -.25 .143
  [3,25,5.2095,-.25,1.8304,3.475,-.25,.429,3.475,-.25,.143],
// 3 25 5.2095 -.25 1.8304 3.475 -.25 .143 3.475 -.25 -.143
  [3,25,5.2095,-.25,1.8304,3.475,-.25,.143,3.475,-.25,-.143],
// 3 25 5.2095 -.25 1.8304 3.475 -.25 -.143 3.475 -.25 -.429
  [3,25,5.2095,-.25,1.8304,3.475,-.25,-.143,3.475,-.25,-.429],
// 3 25 5.2095 -.25 1.8304 3.475 -.25 -.429 3.475 -.25 -.715
  [3,25,5.2095,-.25,1.8304,3.475,-.25,-.429,3.475,-.25,-.715],
// 4 25 5.2095 -.25 1.8304 3.475 -.25 -.715 3.475 -.25 -1.001 4.9244 -.25 -3.8781
  [4,25,5.2095,-.25,1.8304,3.475,-.25,-.715,3.475,-.25,-1.001,4.9244,-.25,-3.8781],
// 3 25 4.1937 -.25 -3.7551 3.475 -.25 -3.003 3.475 -.25 -3.289
  [3,25,4.1937,-.25,-3.7551,3.475,-.25,-3.003,3.475,-.25,-3.289],
// 3 25 4.1937 -.25 -3.7551 3.475 -.25 -2.717 3.475 -.25 -3.003
  [3,25,4.1937,-.25,-3.7551,3.475,-.25,-2.717,3.475,-.25,-3.003],
// 3 25 4.1937 -.25 -3.7551 3.475 -.25 -2.431 3.475 -.25 -2.717
  [3,25,4.1937,-.25,-3.7551,3.475,-.25,-2.431,3.475,-.25,-2.717],
// 3 25 4.1937 -.25 -3.7551 3.475 -.25 -2.145 3.475 -.25 -2.431
  [3,25,4.1937,-.25,-3.7551,3.475,-.25,-2.145,3.475,-.25,-2.431],
// 4 25 4.1937 -.25 -3.7551 4.9244 -.25 -3.8781 3.475 -.25 -1.859 3.475 -.25 -2.145
  [4,25,4.1937,-.25,-3.7551,4.9244,-.25,-3.8781,3.475,-.25,-1.859,3.475,-.25,-2.145],
// 3 25 4.9244 -.25 -3.8781 3.475 -.25 -1.573 3.475 -.25 -1.859
  [3,25,4.9244,-.25,-3.8781,3.475,-.25,-1.573,3.475,-.25,-1.859],
// 3 25 4.9244 -.25 -3.8781 3.475 -.25 -1.287 3.475 -.25 -1.573
  [3,25,4.9244,-.25,-3.8781,3.475,-.25,-1.287,3.475,-.25,-1.573],
// 3 25 4.9244 -.25 -3.8781 3.475 -.25 -1.001 3.475 -.25 -1.287
  [3,25,4.9244,-.25,-3.8781,3.475,-.25,-1.001,3.475,-.25,-1.287],
// 3 25 .075 -.25 2.8025 3.475 -.25 1.859 3.475 -.25 2.145
  [3,25,.075,-.25,2.8025,3.475,-.25,1.859,3.475,-.25,2.145],
// 3 25 .075 -.25 2.5575 3.475 -.25 1.573 3.475 -.25 1.859
  [3,25,.075,-.25,2.5575,3.475,-.25,1.573,3.475,-.25,1.859],
// 3 25 .075 -.25 2.3125 3.475 -.25 1.287 3.475 -.25 1.573
  [3,25,.075,-.25,2.3125,3.475,-.25,1.287,3.475,-.25,1.573],
// 3 25 .075 -.25 2.0675 3.475 -.25 1.001 3.475 -.25 1.287
  [3,25,.075,-.25,2.0675,3.475,-.25,1.001,3.475,-.25,1.287],
// 3 25 .075 -.25 1.8225 3.475 -.25 .715 3.475 -.25 1.001
  [3,25,.075,-.25,1.8225,3.475,-.25,.715,3.475,-.25,1.001],
// 3 25 .075 -.25 1.5775 3.475 -.25 .429 3.475 -.25 .715
  [3,25,.075,-.25,1.5775,3.475,-.25,.429,3.475,-.25,.715],
// 3 25 .075 -.25 1.3325 3.475 -.25 .143 3.475 -.25 .429
  [3,25,.075,-.25,1.3325,3.475,-.25,.143,3.475,-.25,.429],
// 3 25 .075 -.25 1.0875 3.475 -.25 -.143 3.475 -.25 .143
  [3,25,.075,-.25,1.0875,3.475,-.25,-.143,3.475,-.25,.143],
// 3 25 .075 -.25 .8425 3.475 -.25 -.429 3.475 -.25 -.143
  [3,25,.075,-.25,.8425,3.475,-.25,-.429,3.475,-.25,-.143],
// 3 25 .075 -.25 .5975 3.475 -.25 -.715 3.475 -.25 -.429
  [3,25,.075,-.25,.5975,3.475,-.25,-.715,3.475,-.25,-.429],
// 3 25 .075 -.25 .3525 3.475 -.25 -1.001 3.475 -.25 -.715
  [3,25,.075,-.25,.3525,3.475,-.25,-1.001,3.475,-.25,-.715],
// 3 25 .075 -.25 .1075 3.475 -.25 -1.287 3.475 -.25 -1.001
  [3,25,.075,-.25,.1075,3.475,-.25,-1.287,3.475,-.25,-1.001],
// 3 25 .075 -.25 -.1375 3.475 -.25 -1.573 3.475 -.25 -1.287
  [3,25,.075,-.25,-.1375,3.475,-.25,-1.573,3.475,-.25,-1.287],
// 3 25 .075 -.25 -.3825 3.475 -.25 -1.859 3.475 -.25 -1.573
  [3,25,.075,-.25,-.3825,3.475,-.25,-1.859,3.475,-.25,-1.573],
// 3 25 .075 -.25 -.6275 3.475 -.25 -2.145 3.475 -.25 -1.859
  [3,25,.075,-.25,-.6275,3.475,-.25,-2.145,3.475,-.25,-1.859],
// 3 25 .075 -.25 -.8725 3.475 -.25 -2.431 3.475 -.25 -2.145
  [3,25,.075,-.25,-.8725,3.475,-.25,-2.431,3.475,-.25,-2.145],
// 3 25 .075 -.25 -1.1175 3.475 -.25 -2.717 3.475 -.25 -2.431
  [3,25,.075,-.25,-1.1175,3.475,-.25,-2.717,3.475,-.25,-2.431],
// 3 25 .075 -.25 -1.3625 3.475 -.25 -3.003 3.475 -.25 -2.717
  [3,25,.075,-.25,-1.3625,3.475,-.25,-3.003,3.475,-.25,-2.717],
// 3 25 .075 -.25 -1.6075 3.475 -.25 -3.289 3.475 -.25 -3.003
  [3,25,.075,-.25,-1.6075,3.475,-.25,-3.289,3.475,-.25,-3.003],
// 4 25 4.1937 -.25 -3.7551 3.475 -.25 -3.289 .075 -.25 -1.8525 3.475 -.25 -3.575
  [4,25,4.1937,-.25,-3.7551,3.475,-.25,-3.289,.075,-.25,-1.8525,3.475,-.25,-3.575],
// 4 25 .7646 -.25 -2.3972 1.7154 -.25 -2.902 2.5817 -.25 -3.2739 3.475 -.25 -3.575
  [4,25,.7646,-.25,-2.3972,1.7154,-.25,-2.902,2.5817,-.25,-3.2739,3.475,-.25,-3.575],
];
module ldraw_lib__6177960g(step=0, col=false, unit=2/5, alt=false, line=0.2, solid=!$preview)
    makepoly(ldraw_lib__6177960g(), step=step, col=col, unit=unit, alt=alt, line=line, solid=solid);
ldraw_lib__6177960g(line=0.2);
